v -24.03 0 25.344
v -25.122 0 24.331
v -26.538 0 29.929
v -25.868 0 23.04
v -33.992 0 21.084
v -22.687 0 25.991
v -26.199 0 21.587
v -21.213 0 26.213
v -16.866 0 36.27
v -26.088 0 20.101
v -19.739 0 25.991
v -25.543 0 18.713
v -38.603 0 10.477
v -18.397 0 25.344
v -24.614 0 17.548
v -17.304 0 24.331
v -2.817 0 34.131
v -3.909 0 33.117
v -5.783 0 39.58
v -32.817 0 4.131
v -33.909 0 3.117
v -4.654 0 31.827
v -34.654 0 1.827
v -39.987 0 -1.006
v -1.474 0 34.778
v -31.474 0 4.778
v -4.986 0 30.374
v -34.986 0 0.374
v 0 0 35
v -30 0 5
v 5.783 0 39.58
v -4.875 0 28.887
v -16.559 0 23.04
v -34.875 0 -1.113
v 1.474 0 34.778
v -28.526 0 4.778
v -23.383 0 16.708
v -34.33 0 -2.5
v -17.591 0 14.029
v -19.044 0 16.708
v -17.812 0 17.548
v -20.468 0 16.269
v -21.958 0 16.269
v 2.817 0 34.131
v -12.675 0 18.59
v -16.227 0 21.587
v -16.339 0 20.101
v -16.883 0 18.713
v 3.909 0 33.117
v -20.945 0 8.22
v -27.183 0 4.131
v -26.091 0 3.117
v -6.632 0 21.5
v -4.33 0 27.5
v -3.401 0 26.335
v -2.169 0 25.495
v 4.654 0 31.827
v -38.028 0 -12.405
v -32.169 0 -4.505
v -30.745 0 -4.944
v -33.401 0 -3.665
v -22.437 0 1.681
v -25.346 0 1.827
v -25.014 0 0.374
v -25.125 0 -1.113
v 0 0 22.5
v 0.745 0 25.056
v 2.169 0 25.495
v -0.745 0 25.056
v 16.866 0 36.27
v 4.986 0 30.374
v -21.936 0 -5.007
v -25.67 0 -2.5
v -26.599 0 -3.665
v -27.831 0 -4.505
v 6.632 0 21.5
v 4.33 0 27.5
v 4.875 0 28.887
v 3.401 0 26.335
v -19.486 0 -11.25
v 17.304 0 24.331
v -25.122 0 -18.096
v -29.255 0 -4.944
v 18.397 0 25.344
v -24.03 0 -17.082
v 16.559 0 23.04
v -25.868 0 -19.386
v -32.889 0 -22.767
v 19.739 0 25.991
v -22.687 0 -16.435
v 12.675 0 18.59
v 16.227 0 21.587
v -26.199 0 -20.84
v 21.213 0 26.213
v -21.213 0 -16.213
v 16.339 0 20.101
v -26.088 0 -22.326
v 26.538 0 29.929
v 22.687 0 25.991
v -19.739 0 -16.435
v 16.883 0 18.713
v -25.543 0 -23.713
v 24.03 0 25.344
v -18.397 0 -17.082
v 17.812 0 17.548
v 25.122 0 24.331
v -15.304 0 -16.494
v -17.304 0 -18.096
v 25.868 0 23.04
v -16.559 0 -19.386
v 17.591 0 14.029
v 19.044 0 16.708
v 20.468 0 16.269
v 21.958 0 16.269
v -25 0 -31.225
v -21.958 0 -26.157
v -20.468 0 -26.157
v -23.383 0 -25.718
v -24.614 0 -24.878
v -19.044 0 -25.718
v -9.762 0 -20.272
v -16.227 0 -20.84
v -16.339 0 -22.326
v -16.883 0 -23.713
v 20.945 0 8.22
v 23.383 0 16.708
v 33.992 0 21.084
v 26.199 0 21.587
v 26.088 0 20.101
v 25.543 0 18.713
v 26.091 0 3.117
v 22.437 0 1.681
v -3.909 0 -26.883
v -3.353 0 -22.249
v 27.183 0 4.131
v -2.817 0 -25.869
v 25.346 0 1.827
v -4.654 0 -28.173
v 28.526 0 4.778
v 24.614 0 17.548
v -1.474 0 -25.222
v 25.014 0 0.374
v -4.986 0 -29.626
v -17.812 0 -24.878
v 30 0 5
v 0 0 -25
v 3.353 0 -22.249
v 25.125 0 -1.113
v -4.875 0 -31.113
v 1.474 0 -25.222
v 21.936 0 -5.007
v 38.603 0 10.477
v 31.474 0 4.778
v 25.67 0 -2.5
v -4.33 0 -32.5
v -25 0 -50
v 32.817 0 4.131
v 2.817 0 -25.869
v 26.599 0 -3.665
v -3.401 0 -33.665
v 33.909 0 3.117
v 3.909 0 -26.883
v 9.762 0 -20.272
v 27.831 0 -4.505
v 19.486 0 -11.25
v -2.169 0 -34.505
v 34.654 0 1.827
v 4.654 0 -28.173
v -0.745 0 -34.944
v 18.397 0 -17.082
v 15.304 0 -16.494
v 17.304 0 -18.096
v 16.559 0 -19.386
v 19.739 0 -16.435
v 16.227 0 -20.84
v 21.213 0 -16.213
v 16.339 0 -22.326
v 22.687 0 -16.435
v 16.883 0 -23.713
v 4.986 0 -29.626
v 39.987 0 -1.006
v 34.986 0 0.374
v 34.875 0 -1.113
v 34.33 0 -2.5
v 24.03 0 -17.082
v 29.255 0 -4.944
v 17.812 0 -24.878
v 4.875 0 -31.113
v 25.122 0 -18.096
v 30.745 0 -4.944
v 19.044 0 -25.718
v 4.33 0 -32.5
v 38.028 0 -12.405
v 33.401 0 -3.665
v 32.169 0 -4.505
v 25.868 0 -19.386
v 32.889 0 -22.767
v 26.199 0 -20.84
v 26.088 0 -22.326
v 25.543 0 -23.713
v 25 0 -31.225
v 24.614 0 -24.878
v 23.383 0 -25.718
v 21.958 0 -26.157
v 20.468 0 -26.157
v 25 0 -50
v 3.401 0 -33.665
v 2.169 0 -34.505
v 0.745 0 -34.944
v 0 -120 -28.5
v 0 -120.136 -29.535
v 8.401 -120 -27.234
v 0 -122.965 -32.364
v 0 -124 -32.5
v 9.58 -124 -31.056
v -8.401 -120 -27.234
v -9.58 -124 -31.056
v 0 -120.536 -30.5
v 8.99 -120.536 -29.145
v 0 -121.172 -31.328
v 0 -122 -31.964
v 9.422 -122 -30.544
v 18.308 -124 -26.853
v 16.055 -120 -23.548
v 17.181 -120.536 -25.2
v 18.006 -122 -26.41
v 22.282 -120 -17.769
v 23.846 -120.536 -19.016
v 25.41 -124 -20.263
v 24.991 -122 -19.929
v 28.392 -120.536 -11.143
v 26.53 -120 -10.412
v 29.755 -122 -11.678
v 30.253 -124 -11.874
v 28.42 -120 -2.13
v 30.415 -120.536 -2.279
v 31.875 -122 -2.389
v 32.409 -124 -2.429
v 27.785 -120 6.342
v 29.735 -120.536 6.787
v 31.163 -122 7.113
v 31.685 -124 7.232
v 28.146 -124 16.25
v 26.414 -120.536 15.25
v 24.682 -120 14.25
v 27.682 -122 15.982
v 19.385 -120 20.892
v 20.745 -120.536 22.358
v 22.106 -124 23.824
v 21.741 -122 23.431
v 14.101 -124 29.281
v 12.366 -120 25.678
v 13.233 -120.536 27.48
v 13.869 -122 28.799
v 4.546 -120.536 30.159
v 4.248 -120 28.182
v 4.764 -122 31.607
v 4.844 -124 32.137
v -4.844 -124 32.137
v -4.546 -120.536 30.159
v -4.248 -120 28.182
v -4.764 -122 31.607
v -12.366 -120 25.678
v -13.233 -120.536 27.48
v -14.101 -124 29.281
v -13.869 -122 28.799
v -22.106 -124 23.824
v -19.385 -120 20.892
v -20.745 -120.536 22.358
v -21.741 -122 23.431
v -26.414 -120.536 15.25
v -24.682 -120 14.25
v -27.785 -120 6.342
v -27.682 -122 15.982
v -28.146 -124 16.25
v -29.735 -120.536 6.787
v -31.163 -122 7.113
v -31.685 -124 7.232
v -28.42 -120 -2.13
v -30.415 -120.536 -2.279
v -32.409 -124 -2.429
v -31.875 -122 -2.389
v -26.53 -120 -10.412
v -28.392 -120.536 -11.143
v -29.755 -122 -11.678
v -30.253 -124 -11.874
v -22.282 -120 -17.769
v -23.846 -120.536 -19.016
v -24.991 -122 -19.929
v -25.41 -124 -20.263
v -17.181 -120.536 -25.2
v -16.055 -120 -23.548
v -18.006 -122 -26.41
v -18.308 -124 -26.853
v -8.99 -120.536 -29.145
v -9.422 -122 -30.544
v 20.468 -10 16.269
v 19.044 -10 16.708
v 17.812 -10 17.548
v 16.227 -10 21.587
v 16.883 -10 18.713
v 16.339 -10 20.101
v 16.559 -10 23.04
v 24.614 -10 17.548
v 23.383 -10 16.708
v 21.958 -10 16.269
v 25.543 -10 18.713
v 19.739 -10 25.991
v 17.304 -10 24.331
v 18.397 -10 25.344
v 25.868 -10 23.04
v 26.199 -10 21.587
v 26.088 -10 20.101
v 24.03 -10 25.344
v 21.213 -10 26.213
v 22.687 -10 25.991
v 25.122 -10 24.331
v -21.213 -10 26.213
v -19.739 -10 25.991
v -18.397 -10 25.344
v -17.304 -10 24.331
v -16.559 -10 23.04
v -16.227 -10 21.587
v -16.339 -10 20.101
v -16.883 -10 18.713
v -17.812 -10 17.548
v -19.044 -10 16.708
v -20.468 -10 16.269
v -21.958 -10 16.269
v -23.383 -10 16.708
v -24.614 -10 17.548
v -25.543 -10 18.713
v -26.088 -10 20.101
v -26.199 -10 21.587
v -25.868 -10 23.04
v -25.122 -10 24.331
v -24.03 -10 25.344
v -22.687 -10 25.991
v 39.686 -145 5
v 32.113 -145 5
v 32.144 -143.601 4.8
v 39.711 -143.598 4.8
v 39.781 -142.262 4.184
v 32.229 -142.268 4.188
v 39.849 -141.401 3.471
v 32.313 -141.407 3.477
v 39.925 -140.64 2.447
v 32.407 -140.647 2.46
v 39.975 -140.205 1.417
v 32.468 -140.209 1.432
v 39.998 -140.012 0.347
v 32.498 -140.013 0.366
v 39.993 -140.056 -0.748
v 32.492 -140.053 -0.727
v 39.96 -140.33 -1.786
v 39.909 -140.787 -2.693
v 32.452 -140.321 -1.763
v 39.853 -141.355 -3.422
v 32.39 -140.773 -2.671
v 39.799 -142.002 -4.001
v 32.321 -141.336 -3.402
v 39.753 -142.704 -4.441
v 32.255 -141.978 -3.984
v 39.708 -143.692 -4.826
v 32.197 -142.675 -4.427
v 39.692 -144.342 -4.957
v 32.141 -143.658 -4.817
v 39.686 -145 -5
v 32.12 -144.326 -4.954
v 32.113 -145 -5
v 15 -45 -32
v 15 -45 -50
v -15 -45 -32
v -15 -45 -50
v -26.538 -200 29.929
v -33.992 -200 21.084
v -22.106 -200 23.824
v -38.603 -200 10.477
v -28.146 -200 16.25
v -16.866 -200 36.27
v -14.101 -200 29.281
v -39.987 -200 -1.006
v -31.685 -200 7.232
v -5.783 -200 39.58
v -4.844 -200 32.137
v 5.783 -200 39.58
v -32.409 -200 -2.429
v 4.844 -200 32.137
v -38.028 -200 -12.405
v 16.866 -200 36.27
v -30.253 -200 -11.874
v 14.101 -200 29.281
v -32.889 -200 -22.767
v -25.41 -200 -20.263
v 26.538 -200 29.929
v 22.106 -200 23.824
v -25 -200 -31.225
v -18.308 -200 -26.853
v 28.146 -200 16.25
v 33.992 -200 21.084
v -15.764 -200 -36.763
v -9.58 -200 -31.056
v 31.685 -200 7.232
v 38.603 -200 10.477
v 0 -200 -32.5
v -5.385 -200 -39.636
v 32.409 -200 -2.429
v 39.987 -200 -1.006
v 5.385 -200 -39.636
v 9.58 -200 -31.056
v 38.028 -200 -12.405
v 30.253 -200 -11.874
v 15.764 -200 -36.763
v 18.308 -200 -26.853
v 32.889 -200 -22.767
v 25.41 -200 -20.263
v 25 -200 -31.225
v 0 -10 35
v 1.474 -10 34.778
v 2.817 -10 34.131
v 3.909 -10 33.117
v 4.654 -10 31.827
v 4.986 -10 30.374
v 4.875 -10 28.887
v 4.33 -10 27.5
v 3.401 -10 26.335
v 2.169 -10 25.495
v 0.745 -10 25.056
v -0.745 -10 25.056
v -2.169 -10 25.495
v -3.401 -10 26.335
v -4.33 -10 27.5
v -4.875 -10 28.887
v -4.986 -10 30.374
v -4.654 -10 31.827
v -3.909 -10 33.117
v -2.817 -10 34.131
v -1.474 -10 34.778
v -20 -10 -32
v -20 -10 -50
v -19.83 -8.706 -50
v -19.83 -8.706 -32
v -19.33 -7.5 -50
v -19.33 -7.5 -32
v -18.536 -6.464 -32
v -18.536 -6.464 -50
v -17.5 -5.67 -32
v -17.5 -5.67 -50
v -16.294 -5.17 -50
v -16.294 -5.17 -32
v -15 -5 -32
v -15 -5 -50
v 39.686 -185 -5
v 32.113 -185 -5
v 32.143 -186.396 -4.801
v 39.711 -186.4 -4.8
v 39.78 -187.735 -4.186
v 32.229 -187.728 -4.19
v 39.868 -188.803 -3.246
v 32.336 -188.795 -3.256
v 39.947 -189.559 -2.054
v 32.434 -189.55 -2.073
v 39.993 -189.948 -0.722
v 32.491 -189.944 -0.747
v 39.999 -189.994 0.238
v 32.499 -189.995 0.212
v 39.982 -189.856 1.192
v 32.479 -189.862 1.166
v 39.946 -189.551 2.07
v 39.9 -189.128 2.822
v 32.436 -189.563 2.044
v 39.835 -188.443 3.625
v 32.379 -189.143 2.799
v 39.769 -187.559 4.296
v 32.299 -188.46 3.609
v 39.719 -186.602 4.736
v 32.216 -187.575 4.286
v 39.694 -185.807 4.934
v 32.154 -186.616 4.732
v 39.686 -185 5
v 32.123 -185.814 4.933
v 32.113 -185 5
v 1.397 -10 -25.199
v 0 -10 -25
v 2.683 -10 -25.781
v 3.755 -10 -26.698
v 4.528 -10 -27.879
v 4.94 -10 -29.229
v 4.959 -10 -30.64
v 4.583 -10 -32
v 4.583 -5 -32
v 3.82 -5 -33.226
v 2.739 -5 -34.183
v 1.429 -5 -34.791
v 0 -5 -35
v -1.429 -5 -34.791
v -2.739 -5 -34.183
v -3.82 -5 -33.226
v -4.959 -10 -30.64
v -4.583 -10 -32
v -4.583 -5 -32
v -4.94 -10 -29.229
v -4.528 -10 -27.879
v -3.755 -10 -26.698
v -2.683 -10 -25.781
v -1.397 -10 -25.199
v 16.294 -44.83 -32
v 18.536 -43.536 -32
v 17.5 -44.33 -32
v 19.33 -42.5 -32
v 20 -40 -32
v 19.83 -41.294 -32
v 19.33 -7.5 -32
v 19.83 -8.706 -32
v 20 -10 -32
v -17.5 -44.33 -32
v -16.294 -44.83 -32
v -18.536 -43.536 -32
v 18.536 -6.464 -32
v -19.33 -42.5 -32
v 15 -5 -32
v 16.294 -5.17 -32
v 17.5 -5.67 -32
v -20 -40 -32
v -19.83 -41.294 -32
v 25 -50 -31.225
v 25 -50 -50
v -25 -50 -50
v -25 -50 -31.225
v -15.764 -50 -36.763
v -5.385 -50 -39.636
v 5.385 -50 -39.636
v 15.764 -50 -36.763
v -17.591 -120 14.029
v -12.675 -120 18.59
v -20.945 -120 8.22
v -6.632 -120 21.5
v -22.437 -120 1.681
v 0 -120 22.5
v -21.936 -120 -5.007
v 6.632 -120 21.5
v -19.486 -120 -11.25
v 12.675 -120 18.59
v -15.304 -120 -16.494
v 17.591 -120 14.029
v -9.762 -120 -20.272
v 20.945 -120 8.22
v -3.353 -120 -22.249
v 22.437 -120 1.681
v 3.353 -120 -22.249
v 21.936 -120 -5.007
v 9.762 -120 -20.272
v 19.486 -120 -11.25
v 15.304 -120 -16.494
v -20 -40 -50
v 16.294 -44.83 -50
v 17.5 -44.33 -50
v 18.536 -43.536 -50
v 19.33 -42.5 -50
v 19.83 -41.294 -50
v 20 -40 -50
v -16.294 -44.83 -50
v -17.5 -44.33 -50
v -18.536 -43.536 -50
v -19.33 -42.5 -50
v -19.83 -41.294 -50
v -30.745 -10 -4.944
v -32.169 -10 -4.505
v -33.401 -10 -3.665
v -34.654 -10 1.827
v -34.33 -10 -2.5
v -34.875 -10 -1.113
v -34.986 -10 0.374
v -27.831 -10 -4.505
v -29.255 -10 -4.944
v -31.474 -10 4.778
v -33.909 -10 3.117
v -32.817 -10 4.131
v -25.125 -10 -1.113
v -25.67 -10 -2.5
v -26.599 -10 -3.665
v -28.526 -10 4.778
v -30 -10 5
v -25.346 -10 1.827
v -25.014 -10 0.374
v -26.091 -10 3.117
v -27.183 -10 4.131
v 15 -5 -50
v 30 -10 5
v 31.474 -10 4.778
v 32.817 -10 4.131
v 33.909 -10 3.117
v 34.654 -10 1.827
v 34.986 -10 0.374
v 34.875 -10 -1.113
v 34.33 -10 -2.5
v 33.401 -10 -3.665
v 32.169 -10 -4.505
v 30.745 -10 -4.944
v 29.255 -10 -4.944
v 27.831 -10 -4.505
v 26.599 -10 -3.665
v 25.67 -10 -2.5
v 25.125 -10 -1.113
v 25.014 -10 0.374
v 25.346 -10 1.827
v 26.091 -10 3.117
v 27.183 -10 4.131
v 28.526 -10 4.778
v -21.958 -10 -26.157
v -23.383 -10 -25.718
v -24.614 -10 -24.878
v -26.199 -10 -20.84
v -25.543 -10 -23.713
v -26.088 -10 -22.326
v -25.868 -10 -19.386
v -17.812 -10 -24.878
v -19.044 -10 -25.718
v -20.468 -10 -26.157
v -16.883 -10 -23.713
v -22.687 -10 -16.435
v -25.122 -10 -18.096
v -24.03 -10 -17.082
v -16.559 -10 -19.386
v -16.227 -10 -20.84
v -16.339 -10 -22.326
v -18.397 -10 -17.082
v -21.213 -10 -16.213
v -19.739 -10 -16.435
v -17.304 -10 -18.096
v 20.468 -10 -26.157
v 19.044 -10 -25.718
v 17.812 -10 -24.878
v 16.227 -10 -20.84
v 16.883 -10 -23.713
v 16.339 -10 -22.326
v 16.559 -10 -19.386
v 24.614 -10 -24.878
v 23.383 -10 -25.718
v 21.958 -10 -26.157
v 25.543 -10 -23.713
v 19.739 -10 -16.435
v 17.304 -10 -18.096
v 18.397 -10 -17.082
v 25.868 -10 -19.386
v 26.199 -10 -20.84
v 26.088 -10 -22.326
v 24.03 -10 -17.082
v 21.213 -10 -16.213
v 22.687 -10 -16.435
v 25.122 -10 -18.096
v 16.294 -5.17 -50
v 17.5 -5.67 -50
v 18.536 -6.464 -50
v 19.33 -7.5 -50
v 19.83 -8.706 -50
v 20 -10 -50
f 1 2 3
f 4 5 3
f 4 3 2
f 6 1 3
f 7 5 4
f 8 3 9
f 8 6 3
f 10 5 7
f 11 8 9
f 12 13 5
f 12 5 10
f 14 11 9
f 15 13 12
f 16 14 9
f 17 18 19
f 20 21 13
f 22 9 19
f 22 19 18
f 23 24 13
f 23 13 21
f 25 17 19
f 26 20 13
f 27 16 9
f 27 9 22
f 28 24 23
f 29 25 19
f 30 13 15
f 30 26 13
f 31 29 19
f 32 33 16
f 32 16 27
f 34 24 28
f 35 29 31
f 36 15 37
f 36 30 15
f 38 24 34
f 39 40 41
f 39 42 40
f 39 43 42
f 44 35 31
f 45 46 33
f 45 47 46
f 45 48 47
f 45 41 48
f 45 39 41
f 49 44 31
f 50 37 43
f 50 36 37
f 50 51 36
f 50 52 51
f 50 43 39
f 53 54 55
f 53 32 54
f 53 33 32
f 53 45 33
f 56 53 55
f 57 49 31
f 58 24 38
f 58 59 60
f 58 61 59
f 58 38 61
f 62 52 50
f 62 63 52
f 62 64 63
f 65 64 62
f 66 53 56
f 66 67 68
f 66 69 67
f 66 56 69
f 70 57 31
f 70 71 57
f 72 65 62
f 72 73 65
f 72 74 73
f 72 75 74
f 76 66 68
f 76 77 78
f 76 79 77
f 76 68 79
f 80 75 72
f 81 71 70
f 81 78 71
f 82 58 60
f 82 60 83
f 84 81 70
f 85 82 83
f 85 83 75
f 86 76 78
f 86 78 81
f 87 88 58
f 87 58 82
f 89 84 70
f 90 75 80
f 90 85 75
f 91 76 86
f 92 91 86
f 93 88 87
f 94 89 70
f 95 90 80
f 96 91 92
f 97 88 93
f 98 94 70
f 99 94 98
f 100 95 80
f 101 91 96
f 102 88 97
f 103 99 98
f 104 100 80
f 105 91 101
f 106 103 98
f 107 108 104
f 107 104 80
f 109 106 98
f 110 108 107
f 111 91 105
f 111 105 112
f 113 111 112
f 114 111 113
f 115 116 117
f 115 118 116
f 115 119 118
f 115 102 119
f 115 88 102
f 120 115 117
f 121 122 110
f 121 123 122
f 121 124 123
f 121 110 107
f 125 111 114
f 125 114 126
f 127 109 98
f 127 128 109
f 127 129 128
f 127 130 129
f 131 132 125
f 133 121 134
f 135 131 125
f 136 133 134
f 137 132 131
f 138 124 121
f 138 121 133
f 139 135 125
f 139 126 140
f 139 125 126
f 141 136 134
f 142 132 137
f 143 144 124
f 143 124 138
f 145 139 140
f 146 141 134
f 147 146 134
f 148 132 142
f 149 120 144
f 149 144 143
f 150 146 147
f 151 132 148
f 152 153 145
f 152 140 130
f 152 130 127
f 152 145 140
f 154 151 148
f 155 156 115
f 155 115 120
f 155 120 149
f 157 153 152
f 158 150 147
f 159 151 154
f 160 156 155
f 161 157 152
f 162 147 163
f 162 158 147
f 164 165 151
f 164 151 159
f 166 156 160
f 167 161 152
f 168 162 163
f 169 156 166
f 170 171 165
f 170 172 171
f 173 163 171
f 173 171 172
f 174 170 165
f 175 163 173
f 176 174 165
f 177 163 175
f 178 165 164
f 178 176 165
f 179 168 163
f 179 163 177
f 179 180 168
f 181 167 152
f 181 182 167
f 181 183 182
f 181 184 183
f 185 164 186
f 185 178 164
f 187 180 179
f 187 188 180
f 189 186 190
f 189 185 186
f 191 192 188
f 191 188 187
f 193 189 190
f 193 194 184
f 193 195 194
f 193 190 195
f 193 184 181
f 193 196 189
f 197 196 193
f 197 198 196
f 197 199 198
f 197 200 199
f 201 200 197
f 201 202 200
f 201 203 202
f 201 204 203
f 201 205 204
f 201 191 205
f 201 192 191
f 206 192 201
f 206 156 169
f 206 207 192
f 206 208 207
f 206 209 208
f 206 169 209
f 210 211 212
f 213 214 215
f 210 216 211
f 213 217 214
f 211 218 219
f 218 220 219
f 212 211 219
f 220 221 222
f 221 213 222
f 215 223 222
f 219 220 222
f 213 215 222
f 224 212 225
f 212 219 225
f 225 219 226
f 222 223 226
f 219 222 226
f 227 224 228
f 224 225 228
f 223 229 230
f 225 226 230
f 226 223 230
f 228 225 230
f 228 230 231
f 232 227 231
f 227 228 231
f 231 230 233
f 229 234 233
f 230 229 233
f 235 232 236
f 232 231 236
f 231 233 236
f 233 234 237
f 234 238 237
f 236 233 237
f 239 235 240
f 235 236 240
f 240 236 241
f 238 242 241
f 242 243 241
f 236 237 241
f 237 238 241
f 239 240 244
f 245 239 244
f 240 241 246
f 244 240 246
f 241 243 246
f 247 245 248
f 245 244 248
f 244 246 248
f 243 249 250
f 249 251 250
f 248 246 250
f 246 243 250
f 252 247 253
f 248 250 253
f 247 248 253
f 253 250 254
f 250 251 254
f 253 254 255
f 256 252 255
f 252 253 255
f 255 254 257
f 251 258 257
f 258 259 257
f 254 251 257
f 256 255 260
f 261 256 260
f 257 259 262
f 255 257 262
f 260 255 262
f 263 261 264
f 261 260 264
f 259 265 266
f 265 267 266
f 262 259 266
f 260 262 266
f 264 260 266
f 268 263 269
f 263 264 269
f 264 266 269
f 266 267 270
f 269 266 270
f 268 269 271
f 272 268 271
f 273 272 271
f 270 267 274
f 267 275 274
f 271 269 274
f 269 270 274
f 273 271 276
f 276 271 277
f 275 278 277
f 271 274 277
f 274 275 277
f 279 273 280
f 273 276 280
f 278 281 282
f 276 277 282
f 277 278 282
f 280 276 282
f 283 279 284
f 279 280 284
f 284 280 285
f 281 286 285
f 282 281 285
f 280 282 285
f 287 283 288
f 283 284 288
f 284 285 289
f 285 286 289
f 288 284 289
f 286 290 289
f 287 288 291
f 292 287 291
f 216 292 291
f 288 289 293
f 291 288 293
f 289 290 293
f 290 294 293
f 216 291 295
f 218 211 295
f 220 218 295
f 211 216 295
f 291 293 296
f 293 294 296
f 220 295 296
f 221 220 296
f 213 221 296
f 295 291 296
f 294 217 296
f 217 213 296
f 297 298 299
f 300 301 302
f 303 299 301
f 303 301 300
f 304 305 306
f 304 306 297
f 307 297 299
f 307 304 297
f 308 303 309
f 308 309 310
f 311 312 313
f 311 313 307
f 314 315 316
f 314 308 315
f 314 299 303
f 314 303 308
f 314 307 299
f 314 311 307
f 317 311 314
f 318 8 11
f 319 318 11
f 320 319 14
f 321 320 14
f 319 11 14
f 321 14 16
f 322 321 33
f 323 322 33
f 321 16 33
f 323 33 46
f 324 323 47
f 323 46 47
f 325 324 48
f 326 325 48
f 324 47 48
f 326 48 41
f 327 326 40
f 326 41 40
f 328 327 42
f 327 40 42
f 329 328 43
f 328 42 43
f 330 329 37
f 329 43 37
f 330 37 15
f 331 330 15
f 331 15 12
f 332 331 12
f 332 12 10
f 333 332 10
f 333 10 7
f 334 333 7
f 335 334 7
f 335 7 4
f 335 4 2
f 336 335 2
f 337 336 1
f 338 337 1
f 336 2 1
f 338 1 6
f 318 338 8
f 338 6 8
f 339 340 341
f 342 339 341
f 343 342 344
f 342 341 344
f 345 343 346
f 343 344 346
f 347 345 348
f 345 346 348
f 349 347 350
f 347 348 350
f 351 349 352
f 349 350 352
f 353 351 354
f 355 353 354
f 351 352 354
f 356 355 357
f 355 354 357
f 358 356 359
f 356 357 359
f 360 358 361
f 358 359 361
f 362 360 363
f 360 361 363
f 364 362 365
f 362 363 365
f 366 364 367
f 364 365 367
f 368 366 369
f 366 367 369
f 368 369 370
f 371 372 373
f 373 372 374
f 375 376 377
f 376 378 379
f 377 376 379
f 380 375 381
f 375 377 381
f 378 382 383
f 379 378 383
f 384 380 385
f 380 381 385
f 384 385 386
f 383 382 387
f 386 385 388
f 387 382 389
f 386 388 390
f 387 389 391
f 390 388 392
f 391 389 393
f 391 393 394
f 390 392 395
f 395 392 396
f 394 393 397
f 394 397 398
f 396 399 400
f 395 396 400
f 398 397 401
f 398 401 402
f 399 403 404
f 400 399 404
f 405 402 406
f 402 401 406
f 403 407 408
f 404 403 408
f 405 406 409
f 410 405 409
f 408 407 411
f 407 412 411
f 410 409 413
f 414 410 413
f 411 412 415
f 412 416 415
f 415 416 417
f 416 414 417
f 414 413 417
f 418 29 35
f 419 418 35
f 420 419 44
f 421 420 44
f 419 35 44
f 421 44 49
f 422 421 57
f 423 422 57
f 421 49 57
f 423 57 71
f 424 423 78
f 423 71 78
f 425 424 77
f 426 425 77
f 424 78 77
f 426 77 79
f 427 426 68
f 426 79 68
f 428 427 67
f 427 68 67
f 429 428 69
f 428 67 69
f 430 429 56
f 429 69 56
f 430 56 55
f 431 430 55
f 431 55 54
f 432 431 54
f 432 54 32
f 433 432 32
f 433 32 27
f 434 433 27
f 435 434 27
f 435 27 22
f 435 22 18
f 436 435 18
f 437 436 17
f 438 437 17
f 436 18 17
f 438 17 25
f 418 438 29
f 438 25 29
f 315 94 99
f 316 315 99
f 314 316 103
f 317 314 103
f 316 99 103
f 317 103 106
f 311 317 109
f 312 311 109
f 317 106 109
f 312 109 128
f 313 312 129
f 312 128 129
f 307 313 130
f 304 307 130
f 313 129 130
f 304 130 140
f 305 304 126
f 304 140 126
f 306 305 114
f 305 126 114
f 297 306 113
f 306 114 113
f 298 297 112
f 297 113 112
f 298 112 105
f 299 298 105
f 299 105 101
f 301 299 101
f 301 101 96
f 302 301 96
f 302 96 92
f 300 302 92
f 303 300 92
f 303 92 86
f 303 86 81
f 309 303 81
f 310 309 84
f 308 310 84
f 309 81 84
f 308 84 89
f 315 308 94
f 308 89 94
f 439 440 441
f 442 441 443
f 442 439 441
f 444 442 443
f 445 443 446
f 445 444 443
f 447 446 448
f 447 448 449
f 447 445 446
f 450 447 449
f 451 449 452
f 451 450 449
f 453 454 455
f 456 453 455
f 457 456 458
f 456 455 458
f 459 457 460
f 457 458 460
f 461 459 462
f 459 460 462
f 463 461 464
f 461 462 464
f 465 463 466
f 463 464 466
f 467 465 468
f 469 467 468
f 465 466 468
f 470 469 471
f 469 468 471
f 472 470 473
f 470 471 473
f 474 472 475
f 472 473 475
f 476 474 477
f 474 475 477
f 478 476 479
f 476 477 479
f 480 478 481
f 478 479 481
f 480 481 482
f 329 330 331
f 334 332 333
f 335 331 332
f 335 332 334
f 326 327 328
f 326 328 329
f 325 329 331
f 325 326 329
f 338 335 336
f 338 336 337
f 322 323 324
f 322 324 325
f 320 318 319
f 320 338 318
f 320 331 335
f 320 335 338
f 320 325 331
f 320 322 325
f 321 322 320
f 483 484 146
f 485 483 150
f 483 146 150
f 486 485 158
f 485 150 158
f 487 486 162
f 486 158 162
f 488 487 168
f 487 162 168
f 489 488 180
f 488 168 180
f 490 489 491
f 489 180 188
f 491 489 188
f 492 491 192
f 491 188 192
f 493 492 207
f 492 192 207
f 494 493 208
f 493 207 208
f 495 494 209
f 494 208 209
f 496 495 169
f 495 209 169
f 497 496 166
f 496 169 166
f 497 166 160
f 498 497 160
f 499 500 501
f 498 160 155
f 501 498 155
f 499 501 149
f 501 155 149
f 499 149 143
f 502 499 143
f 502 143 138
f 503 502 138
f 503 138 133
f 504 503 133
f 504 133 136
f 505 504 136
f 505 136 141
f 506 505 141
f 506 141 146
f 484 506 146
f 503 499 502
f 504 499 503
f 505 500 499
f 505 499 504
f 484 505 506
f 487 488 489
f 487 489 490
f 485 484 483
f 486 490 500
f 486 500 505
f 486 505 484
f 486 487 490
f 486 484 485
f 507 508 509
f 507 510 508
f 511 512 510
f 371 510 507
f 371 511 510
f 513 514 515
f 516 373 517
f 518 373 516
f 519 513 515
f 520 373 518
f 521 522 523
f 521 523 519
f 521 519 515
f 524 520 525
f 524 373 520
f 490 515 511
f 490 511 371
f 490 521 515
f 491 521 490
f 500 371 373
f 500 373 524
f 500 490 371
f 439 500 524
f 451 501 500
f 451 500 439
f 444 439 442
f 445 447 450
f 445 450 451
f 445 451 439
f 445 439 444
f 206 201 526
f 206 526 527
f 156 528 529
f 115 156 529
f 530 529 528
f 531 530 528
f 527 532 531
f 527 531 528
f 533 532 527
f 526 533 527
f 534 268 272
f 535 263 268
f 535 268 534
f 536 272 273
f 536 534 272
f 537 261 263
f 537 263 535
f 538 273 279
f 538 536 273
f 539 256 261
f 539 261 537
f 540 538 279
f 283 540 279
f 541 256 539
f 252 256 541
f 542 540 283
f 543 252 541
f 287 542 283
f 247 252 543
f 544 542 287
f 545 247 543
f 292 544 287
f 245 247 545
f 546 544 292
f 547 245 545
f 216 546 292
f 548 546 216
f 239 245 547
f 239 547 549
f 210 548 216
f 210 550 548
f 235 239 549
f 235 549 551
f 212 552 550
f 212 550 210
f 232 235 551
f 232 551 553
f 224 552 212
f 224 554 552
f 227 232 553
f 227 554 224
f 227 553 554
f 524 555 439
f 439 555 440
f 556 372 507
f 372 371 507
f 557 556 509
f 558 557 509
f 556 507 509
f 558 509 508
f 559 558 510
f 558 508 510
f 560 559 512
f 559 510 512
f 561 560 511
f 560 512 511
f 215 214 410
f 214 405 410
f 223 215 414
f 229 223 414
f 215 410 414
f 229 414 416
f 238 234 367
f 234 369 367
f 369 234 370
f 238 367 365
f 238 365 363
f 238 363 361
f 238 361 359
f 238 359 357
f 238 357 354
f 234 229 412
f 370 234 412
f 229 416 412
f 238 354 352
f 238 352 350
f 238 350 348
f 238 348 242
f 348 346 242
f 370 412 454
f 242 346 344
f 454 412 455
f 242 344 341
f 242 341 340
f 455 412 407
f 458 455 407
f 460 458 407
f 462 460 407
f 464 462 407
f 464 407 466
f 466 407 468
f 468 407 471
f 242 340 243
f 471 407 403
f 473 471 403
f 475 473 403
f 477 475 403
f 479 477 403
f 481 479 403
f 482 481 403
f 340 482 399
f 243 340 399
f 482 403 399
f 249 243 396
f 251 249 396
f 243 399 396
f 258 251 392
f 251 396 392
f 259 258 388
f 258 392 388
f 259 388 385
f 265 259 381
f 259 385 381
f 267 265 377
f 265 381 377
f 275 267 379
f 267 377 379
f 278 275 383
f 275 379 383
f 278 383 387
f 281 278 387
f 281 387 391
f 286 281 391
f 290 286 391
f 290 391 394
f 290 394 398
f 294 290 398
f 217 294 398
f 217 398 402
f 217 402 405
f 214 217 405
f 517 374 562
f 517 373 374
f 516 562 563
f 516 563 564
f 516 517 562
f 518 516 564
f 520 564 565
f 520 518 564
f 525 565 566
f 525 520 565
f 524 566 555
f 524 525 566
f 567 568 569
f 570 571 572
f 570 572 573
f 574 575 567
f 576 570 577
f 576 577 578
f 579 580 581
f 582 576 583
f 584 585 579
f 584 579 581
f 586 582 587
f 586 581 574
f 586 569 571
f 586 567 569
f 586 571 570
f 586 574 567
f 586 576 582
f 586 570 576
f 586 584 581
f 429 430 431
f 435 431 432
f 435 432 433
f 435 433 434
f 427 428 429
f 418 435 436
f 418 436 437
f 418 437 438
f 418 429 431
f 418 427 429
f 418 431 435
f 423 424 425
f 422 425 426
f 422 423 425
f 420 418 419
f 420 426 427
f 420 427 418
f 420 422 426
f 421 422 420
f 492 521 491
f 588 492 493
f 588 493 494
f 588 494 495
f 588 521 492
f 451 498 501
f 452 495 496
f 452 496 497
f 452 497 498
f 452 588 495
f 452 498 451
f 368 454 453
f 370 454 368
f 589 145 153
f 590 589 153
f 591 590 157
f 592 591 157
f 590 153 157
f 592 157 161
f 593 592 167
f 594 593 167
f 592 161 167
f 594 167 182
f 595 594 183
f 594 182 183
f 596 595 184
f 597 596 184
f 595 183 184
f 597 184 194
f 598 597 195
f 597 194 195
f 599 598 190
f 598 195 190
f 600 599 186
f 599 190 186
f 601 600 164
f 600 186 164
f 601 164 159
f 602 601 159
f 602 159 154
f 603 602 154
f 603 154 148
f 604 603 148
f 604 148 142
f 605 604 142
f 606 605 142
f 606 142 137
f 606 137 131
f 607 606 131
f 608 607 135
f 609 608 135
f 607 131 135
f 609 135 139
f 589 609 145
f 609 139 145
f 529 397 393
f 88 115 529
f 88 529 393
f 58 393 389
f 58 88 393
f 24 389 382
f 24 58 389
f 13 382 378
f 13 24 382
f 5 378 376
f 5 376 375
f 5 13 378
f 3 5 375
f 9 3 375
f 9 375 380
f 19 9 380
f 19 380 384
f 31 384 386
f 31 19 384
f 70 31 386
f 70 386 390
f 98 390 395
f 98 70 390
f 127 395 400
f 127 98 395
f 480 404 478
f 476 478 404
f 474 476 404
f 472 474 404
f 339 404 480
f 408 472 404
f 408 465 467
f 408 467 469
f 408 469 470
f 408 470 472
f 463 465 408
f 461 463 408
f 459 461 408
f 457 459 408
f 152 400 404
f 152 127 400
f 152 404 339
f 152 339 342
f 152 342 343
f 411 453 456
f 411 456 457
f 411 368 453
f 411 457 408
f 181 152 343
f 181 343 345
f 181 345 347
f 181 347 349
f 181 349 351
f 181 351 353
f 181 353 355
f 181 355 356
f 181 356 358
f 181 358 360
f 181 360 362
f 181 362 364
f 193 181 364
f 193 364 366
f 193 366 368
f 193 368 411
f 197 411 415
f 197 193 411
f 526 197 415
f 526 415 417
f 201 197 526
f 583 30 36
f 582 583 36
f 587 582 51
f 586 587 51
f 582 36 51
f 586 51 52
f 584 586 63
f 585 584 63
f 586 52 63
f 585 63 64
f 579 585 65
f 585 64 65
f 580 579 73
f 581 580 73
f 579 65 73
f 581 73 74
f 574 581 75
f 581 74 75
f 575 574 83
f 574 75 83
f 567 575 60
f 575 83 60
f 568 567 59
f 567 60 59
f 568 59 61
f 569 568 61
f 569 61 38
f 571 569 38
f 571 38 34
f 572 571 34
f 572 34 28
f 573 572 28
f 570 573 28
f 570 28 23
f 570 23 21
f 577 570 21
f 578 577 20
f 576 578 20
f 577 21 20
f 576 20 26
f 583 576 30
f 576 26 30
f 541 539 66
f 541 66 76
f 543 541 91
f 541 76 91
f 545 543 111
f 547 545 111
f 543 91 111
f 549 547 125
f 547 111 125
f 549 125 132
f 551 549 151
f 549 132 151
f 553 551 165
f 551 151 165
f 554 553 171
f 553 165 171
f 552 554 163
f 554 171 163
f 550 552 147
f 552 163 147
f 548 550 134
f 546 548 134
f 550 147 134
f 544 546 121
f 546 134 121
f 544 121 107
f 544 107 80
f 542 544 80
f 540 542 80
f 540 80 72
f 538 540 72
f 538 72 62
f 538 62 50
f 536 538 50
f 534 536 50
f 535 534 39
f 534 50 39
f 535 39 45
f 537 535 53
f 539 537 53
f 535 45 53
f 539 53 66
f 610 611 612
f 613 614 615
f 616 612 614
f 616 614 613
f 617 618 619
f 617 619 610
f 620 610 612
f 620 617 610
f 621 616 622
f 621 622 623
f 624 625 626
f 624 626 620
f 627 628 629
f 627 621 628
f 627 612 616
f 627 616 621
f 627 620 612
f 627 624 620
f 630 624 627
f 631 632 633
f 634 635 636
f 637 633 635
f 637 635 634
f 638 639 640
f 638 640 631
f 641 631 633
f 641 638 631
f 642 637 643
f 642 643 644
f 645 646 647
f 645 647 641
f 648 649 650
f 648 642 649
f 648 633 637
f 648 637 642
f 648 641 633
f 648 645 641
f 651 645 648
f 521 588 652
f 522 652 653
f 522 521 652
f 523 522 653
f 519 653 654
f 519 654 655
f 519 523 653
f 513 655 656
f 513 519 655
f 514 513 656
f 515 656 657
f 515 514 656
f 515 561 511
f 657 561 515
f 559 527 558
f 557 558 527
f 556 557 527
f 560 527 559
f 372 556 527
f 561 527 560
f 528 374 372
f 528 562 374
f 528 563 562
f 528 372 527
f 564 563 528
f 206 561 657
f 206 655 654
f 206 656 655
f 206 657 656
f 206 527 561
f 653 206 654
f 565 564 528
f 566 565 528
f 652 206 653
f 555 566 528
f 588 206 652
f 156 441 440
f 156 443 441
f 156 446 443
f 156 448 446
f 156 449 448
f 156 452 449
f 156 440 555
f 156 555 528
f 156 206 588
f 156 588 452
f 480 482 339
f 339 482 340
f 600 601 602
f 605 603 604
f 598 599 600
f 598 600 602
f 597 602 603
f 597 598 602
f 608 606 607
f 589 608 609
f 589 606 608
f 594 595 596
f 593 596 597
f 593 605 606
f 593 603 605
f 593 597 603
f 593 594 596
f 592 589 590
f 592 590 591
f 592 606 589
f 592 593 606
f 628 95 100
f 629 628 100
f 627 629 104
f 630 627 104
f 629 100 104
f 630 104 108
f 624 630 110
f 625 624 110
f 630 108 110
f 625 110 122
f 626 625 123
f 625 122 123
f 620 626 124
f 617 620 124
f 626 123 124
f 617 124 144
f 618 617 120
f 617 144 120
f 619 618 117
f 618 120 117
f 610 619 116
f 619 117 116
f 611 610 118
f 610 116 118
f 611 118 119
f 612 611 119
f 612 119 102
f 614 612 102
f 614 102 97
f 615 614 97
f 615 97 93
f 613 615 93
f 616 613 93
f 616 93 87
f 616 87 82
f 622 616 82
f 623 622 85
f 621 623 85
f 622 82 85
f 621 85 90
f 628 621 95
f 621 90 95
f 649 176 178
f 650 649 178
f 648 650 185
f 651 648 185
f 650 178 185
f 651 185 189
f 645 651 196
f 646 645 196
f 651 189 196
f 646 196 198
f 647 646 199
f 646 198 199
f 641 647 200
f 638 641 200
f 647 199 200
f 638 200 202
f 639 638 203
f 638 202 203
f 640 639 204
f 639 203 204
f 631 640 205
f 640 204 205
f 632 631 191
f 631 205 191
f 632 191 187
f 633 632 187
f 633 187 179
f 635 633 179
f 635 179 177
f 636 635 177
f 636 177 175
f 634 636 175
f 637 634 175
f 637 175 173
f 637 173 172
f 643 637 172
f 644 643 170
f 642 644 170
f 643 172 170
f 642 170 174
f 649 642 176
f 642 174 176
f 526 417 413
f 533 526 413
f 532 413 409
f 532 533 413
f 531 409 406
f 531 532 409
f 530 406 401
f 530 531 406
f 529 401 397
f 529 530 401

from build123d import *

# Parameters (mm, degrees)
BOSS_EXTRUDE4_DEPTH = 200
CUT_EXTRUDE3_START  = -150
CUT_EXTRUDE3_DEPTH  = 150
SKETCH6_R           = 22.5
CUT_EXTRUDE5_DEPTH  = 120
SKETCH7_R           = 32.5
CUT_EXTRUDE6_DEPTH  = 80
FILLET2_R           = 4
SKETCH8_W           = 40
SKETCH8_H           = 40
CUT_EXTRUDE7_DEPTH  = 18
FILLET3_R           = 5
SKETCH10_W          = 10
SKETCH10_H          = 40
CUT_EXTRUDE9_DEPTH  = 69
SKETCH11_R          = 5
CUT_EXTRUDE10_DEPTH = 10


with BuildPart() as part:
    # Sketch1 → Boss-Extrude4 (new body)
    with BuildSketch(Plane(origin=(0, 0, 0), x_dir=(1, 0, 0), z_dir=(0, 1, 0))):
        with BuildLine():
            Line((0, 50), (-25, 50))
            Line((-25, 50), (-25, 31.224990005))
            ThreePointArc((-25, 31.224990005), (0, -40.00000001), (25, 31.224990005))
            Line((25, 31.224990005), (25, 50))
            Line((25, 50), (0, 50))
        make_face()
    extrude(amount=-BOSS_EXTRUDE4_DEPTH)

    # Sketch5 → Cut-Extrude3 (cut)
    with BuildSketch(Plane.XZ.offset(200).offset(CUT_EXTRUDE3_START)):
        with BuildLine():
            Line((-25, -31.224990005), (-25, -50))
            Line((-25, -50), (25, -50))
            Line((25, -50), (25, -31.224990005))
            ThreePointArc((25, -31.224990005), (0, -40.00000001), (-25, -31.224990005))
        make_face()
    extrude(amount=CUT_EXTRUDE3_DEPTH, mode=Mode.SUBTRACT)

    # Sketch6 → Cut-Extrude5 (cut)
    with BuildSketch(Plane(origin=(0, 0, 0), x_dir=(1, 0, 0), z_dir=(0, 1, 0))):
        with Locations(Location((0, 0, 0), (0, 0, 270))):
            Circle(SKETCH6_R)
    extrude(amount=-CUT_EXTRUDE5_DEPTH, mode=Mode.SUBTRACT)

    # Sketch7 → Cut-Extrude6 (cut)
    with BuildSketch(Plane.XZ.offset(200)):
        with Locations(Location((0, 0, 0), (0, 0, 270))):
            Circle(SKETCH7_R)
    extrude(amount=-CUT_EXTRUDE6_DEPTH, mode=Mode.SUBTRACT)

    # Fillet2
    fillet2_edges = [part.edges().sort_by_distance(p)[0] for p in [
        (0, -120, 32.5),
    ]]
    fillet(fillet2_edges, radius=FILLET2_R)

    # Sketch8 → Cut-Extrude7 (cut)
    with BuildSketch(Plane(origin=(0, 0, -50), x_dir=(-1, 0, 0), z_dir=(0, 0, -1))):
        with Locations((0, -25)):
            Rectangle(SKETCH8_W, SKETCH8_H)
    extrude(amount=-CUT_EXTRUDE7_DEPTH, mode=Mode.SUBTRACT)

    # Fillet3
    fillet3_edges = [part.edges().sort_by_distance(p)[0] for p in [
        (20, -45, -41),
        (20, -5, -41),
        (-20, -5, -41),
        (-20, -45, -41),
    ]]
    fillet(fillet3_edges, radius=FILLET3_R)

    # Sketch10 → Cut-Extrude9 (cut)
    with BuildSketch(Plane(origin=(0, 0, 0), x_dir=(0, 0, -1), z_dir=(1, 0, 0))):
        with Locations((0, -165)):
            Rectangle(SKETCH10_W, SKETCH10_H)
        with BuildLine():
            Line((5, -145), (-5, -145))
            ThreePointArc((-5, -145), (0, -140), (5, -145))
        make_face()
        with BuildLine():
            ThreePointArc((5, -185), (0, -190), (-5, -185))
            Line((-5, -185), (5, -185))
        make_face()
    extrude(amount=CUT_EXTRUDE9_DEPTH, mode=Mode.SUBTRACT)

    # Sketch11 → Cut-Extrude10 (cut)
    with BuildSketch(Plane(origin=(0, 0, 0), x_dir=(1, 0, 0), z_dir=(0, 1, 0))):
        with Locations(Location((30, 0, 0), (0, 0, 270))):
            Circle(SKETCH11_R)
        with Locations(Location((21.213203436, -21.213203436, 0), (0, 0, 270))):
            Circle(SKETCH11_R)
        with Locations(Location((0, -30, 0), (0, 0, 270))):
            Circle(SKETCH11_R)
        with Locations(Location((-21.213203436, -21.213203436, 0), (0, 0, 270))):
            Circle(SKETCH11_R)
        with Locations(Location((-30, 0, 0), (0, 0, 270))):
            Circle(SKETCH11_R)
        with Locations(Location((-21.213203436, 21.213203436, 0), (0, 0, 270))):
            Circle(SKETCH11_R)
        with Locations(Location((0, 30, 0), (0, 0, 270))):
            Circle(SKETCH11_R)
        with Locations(Location((21.213203436, 21.213203436, 0), (0, 0, 270))):
            Circle(SKETCH11_R)
    extrude(amount=-CUT_EXTRUDE10_DEPTH, mode=Mode.SUBTRACT)


solid = part.part
